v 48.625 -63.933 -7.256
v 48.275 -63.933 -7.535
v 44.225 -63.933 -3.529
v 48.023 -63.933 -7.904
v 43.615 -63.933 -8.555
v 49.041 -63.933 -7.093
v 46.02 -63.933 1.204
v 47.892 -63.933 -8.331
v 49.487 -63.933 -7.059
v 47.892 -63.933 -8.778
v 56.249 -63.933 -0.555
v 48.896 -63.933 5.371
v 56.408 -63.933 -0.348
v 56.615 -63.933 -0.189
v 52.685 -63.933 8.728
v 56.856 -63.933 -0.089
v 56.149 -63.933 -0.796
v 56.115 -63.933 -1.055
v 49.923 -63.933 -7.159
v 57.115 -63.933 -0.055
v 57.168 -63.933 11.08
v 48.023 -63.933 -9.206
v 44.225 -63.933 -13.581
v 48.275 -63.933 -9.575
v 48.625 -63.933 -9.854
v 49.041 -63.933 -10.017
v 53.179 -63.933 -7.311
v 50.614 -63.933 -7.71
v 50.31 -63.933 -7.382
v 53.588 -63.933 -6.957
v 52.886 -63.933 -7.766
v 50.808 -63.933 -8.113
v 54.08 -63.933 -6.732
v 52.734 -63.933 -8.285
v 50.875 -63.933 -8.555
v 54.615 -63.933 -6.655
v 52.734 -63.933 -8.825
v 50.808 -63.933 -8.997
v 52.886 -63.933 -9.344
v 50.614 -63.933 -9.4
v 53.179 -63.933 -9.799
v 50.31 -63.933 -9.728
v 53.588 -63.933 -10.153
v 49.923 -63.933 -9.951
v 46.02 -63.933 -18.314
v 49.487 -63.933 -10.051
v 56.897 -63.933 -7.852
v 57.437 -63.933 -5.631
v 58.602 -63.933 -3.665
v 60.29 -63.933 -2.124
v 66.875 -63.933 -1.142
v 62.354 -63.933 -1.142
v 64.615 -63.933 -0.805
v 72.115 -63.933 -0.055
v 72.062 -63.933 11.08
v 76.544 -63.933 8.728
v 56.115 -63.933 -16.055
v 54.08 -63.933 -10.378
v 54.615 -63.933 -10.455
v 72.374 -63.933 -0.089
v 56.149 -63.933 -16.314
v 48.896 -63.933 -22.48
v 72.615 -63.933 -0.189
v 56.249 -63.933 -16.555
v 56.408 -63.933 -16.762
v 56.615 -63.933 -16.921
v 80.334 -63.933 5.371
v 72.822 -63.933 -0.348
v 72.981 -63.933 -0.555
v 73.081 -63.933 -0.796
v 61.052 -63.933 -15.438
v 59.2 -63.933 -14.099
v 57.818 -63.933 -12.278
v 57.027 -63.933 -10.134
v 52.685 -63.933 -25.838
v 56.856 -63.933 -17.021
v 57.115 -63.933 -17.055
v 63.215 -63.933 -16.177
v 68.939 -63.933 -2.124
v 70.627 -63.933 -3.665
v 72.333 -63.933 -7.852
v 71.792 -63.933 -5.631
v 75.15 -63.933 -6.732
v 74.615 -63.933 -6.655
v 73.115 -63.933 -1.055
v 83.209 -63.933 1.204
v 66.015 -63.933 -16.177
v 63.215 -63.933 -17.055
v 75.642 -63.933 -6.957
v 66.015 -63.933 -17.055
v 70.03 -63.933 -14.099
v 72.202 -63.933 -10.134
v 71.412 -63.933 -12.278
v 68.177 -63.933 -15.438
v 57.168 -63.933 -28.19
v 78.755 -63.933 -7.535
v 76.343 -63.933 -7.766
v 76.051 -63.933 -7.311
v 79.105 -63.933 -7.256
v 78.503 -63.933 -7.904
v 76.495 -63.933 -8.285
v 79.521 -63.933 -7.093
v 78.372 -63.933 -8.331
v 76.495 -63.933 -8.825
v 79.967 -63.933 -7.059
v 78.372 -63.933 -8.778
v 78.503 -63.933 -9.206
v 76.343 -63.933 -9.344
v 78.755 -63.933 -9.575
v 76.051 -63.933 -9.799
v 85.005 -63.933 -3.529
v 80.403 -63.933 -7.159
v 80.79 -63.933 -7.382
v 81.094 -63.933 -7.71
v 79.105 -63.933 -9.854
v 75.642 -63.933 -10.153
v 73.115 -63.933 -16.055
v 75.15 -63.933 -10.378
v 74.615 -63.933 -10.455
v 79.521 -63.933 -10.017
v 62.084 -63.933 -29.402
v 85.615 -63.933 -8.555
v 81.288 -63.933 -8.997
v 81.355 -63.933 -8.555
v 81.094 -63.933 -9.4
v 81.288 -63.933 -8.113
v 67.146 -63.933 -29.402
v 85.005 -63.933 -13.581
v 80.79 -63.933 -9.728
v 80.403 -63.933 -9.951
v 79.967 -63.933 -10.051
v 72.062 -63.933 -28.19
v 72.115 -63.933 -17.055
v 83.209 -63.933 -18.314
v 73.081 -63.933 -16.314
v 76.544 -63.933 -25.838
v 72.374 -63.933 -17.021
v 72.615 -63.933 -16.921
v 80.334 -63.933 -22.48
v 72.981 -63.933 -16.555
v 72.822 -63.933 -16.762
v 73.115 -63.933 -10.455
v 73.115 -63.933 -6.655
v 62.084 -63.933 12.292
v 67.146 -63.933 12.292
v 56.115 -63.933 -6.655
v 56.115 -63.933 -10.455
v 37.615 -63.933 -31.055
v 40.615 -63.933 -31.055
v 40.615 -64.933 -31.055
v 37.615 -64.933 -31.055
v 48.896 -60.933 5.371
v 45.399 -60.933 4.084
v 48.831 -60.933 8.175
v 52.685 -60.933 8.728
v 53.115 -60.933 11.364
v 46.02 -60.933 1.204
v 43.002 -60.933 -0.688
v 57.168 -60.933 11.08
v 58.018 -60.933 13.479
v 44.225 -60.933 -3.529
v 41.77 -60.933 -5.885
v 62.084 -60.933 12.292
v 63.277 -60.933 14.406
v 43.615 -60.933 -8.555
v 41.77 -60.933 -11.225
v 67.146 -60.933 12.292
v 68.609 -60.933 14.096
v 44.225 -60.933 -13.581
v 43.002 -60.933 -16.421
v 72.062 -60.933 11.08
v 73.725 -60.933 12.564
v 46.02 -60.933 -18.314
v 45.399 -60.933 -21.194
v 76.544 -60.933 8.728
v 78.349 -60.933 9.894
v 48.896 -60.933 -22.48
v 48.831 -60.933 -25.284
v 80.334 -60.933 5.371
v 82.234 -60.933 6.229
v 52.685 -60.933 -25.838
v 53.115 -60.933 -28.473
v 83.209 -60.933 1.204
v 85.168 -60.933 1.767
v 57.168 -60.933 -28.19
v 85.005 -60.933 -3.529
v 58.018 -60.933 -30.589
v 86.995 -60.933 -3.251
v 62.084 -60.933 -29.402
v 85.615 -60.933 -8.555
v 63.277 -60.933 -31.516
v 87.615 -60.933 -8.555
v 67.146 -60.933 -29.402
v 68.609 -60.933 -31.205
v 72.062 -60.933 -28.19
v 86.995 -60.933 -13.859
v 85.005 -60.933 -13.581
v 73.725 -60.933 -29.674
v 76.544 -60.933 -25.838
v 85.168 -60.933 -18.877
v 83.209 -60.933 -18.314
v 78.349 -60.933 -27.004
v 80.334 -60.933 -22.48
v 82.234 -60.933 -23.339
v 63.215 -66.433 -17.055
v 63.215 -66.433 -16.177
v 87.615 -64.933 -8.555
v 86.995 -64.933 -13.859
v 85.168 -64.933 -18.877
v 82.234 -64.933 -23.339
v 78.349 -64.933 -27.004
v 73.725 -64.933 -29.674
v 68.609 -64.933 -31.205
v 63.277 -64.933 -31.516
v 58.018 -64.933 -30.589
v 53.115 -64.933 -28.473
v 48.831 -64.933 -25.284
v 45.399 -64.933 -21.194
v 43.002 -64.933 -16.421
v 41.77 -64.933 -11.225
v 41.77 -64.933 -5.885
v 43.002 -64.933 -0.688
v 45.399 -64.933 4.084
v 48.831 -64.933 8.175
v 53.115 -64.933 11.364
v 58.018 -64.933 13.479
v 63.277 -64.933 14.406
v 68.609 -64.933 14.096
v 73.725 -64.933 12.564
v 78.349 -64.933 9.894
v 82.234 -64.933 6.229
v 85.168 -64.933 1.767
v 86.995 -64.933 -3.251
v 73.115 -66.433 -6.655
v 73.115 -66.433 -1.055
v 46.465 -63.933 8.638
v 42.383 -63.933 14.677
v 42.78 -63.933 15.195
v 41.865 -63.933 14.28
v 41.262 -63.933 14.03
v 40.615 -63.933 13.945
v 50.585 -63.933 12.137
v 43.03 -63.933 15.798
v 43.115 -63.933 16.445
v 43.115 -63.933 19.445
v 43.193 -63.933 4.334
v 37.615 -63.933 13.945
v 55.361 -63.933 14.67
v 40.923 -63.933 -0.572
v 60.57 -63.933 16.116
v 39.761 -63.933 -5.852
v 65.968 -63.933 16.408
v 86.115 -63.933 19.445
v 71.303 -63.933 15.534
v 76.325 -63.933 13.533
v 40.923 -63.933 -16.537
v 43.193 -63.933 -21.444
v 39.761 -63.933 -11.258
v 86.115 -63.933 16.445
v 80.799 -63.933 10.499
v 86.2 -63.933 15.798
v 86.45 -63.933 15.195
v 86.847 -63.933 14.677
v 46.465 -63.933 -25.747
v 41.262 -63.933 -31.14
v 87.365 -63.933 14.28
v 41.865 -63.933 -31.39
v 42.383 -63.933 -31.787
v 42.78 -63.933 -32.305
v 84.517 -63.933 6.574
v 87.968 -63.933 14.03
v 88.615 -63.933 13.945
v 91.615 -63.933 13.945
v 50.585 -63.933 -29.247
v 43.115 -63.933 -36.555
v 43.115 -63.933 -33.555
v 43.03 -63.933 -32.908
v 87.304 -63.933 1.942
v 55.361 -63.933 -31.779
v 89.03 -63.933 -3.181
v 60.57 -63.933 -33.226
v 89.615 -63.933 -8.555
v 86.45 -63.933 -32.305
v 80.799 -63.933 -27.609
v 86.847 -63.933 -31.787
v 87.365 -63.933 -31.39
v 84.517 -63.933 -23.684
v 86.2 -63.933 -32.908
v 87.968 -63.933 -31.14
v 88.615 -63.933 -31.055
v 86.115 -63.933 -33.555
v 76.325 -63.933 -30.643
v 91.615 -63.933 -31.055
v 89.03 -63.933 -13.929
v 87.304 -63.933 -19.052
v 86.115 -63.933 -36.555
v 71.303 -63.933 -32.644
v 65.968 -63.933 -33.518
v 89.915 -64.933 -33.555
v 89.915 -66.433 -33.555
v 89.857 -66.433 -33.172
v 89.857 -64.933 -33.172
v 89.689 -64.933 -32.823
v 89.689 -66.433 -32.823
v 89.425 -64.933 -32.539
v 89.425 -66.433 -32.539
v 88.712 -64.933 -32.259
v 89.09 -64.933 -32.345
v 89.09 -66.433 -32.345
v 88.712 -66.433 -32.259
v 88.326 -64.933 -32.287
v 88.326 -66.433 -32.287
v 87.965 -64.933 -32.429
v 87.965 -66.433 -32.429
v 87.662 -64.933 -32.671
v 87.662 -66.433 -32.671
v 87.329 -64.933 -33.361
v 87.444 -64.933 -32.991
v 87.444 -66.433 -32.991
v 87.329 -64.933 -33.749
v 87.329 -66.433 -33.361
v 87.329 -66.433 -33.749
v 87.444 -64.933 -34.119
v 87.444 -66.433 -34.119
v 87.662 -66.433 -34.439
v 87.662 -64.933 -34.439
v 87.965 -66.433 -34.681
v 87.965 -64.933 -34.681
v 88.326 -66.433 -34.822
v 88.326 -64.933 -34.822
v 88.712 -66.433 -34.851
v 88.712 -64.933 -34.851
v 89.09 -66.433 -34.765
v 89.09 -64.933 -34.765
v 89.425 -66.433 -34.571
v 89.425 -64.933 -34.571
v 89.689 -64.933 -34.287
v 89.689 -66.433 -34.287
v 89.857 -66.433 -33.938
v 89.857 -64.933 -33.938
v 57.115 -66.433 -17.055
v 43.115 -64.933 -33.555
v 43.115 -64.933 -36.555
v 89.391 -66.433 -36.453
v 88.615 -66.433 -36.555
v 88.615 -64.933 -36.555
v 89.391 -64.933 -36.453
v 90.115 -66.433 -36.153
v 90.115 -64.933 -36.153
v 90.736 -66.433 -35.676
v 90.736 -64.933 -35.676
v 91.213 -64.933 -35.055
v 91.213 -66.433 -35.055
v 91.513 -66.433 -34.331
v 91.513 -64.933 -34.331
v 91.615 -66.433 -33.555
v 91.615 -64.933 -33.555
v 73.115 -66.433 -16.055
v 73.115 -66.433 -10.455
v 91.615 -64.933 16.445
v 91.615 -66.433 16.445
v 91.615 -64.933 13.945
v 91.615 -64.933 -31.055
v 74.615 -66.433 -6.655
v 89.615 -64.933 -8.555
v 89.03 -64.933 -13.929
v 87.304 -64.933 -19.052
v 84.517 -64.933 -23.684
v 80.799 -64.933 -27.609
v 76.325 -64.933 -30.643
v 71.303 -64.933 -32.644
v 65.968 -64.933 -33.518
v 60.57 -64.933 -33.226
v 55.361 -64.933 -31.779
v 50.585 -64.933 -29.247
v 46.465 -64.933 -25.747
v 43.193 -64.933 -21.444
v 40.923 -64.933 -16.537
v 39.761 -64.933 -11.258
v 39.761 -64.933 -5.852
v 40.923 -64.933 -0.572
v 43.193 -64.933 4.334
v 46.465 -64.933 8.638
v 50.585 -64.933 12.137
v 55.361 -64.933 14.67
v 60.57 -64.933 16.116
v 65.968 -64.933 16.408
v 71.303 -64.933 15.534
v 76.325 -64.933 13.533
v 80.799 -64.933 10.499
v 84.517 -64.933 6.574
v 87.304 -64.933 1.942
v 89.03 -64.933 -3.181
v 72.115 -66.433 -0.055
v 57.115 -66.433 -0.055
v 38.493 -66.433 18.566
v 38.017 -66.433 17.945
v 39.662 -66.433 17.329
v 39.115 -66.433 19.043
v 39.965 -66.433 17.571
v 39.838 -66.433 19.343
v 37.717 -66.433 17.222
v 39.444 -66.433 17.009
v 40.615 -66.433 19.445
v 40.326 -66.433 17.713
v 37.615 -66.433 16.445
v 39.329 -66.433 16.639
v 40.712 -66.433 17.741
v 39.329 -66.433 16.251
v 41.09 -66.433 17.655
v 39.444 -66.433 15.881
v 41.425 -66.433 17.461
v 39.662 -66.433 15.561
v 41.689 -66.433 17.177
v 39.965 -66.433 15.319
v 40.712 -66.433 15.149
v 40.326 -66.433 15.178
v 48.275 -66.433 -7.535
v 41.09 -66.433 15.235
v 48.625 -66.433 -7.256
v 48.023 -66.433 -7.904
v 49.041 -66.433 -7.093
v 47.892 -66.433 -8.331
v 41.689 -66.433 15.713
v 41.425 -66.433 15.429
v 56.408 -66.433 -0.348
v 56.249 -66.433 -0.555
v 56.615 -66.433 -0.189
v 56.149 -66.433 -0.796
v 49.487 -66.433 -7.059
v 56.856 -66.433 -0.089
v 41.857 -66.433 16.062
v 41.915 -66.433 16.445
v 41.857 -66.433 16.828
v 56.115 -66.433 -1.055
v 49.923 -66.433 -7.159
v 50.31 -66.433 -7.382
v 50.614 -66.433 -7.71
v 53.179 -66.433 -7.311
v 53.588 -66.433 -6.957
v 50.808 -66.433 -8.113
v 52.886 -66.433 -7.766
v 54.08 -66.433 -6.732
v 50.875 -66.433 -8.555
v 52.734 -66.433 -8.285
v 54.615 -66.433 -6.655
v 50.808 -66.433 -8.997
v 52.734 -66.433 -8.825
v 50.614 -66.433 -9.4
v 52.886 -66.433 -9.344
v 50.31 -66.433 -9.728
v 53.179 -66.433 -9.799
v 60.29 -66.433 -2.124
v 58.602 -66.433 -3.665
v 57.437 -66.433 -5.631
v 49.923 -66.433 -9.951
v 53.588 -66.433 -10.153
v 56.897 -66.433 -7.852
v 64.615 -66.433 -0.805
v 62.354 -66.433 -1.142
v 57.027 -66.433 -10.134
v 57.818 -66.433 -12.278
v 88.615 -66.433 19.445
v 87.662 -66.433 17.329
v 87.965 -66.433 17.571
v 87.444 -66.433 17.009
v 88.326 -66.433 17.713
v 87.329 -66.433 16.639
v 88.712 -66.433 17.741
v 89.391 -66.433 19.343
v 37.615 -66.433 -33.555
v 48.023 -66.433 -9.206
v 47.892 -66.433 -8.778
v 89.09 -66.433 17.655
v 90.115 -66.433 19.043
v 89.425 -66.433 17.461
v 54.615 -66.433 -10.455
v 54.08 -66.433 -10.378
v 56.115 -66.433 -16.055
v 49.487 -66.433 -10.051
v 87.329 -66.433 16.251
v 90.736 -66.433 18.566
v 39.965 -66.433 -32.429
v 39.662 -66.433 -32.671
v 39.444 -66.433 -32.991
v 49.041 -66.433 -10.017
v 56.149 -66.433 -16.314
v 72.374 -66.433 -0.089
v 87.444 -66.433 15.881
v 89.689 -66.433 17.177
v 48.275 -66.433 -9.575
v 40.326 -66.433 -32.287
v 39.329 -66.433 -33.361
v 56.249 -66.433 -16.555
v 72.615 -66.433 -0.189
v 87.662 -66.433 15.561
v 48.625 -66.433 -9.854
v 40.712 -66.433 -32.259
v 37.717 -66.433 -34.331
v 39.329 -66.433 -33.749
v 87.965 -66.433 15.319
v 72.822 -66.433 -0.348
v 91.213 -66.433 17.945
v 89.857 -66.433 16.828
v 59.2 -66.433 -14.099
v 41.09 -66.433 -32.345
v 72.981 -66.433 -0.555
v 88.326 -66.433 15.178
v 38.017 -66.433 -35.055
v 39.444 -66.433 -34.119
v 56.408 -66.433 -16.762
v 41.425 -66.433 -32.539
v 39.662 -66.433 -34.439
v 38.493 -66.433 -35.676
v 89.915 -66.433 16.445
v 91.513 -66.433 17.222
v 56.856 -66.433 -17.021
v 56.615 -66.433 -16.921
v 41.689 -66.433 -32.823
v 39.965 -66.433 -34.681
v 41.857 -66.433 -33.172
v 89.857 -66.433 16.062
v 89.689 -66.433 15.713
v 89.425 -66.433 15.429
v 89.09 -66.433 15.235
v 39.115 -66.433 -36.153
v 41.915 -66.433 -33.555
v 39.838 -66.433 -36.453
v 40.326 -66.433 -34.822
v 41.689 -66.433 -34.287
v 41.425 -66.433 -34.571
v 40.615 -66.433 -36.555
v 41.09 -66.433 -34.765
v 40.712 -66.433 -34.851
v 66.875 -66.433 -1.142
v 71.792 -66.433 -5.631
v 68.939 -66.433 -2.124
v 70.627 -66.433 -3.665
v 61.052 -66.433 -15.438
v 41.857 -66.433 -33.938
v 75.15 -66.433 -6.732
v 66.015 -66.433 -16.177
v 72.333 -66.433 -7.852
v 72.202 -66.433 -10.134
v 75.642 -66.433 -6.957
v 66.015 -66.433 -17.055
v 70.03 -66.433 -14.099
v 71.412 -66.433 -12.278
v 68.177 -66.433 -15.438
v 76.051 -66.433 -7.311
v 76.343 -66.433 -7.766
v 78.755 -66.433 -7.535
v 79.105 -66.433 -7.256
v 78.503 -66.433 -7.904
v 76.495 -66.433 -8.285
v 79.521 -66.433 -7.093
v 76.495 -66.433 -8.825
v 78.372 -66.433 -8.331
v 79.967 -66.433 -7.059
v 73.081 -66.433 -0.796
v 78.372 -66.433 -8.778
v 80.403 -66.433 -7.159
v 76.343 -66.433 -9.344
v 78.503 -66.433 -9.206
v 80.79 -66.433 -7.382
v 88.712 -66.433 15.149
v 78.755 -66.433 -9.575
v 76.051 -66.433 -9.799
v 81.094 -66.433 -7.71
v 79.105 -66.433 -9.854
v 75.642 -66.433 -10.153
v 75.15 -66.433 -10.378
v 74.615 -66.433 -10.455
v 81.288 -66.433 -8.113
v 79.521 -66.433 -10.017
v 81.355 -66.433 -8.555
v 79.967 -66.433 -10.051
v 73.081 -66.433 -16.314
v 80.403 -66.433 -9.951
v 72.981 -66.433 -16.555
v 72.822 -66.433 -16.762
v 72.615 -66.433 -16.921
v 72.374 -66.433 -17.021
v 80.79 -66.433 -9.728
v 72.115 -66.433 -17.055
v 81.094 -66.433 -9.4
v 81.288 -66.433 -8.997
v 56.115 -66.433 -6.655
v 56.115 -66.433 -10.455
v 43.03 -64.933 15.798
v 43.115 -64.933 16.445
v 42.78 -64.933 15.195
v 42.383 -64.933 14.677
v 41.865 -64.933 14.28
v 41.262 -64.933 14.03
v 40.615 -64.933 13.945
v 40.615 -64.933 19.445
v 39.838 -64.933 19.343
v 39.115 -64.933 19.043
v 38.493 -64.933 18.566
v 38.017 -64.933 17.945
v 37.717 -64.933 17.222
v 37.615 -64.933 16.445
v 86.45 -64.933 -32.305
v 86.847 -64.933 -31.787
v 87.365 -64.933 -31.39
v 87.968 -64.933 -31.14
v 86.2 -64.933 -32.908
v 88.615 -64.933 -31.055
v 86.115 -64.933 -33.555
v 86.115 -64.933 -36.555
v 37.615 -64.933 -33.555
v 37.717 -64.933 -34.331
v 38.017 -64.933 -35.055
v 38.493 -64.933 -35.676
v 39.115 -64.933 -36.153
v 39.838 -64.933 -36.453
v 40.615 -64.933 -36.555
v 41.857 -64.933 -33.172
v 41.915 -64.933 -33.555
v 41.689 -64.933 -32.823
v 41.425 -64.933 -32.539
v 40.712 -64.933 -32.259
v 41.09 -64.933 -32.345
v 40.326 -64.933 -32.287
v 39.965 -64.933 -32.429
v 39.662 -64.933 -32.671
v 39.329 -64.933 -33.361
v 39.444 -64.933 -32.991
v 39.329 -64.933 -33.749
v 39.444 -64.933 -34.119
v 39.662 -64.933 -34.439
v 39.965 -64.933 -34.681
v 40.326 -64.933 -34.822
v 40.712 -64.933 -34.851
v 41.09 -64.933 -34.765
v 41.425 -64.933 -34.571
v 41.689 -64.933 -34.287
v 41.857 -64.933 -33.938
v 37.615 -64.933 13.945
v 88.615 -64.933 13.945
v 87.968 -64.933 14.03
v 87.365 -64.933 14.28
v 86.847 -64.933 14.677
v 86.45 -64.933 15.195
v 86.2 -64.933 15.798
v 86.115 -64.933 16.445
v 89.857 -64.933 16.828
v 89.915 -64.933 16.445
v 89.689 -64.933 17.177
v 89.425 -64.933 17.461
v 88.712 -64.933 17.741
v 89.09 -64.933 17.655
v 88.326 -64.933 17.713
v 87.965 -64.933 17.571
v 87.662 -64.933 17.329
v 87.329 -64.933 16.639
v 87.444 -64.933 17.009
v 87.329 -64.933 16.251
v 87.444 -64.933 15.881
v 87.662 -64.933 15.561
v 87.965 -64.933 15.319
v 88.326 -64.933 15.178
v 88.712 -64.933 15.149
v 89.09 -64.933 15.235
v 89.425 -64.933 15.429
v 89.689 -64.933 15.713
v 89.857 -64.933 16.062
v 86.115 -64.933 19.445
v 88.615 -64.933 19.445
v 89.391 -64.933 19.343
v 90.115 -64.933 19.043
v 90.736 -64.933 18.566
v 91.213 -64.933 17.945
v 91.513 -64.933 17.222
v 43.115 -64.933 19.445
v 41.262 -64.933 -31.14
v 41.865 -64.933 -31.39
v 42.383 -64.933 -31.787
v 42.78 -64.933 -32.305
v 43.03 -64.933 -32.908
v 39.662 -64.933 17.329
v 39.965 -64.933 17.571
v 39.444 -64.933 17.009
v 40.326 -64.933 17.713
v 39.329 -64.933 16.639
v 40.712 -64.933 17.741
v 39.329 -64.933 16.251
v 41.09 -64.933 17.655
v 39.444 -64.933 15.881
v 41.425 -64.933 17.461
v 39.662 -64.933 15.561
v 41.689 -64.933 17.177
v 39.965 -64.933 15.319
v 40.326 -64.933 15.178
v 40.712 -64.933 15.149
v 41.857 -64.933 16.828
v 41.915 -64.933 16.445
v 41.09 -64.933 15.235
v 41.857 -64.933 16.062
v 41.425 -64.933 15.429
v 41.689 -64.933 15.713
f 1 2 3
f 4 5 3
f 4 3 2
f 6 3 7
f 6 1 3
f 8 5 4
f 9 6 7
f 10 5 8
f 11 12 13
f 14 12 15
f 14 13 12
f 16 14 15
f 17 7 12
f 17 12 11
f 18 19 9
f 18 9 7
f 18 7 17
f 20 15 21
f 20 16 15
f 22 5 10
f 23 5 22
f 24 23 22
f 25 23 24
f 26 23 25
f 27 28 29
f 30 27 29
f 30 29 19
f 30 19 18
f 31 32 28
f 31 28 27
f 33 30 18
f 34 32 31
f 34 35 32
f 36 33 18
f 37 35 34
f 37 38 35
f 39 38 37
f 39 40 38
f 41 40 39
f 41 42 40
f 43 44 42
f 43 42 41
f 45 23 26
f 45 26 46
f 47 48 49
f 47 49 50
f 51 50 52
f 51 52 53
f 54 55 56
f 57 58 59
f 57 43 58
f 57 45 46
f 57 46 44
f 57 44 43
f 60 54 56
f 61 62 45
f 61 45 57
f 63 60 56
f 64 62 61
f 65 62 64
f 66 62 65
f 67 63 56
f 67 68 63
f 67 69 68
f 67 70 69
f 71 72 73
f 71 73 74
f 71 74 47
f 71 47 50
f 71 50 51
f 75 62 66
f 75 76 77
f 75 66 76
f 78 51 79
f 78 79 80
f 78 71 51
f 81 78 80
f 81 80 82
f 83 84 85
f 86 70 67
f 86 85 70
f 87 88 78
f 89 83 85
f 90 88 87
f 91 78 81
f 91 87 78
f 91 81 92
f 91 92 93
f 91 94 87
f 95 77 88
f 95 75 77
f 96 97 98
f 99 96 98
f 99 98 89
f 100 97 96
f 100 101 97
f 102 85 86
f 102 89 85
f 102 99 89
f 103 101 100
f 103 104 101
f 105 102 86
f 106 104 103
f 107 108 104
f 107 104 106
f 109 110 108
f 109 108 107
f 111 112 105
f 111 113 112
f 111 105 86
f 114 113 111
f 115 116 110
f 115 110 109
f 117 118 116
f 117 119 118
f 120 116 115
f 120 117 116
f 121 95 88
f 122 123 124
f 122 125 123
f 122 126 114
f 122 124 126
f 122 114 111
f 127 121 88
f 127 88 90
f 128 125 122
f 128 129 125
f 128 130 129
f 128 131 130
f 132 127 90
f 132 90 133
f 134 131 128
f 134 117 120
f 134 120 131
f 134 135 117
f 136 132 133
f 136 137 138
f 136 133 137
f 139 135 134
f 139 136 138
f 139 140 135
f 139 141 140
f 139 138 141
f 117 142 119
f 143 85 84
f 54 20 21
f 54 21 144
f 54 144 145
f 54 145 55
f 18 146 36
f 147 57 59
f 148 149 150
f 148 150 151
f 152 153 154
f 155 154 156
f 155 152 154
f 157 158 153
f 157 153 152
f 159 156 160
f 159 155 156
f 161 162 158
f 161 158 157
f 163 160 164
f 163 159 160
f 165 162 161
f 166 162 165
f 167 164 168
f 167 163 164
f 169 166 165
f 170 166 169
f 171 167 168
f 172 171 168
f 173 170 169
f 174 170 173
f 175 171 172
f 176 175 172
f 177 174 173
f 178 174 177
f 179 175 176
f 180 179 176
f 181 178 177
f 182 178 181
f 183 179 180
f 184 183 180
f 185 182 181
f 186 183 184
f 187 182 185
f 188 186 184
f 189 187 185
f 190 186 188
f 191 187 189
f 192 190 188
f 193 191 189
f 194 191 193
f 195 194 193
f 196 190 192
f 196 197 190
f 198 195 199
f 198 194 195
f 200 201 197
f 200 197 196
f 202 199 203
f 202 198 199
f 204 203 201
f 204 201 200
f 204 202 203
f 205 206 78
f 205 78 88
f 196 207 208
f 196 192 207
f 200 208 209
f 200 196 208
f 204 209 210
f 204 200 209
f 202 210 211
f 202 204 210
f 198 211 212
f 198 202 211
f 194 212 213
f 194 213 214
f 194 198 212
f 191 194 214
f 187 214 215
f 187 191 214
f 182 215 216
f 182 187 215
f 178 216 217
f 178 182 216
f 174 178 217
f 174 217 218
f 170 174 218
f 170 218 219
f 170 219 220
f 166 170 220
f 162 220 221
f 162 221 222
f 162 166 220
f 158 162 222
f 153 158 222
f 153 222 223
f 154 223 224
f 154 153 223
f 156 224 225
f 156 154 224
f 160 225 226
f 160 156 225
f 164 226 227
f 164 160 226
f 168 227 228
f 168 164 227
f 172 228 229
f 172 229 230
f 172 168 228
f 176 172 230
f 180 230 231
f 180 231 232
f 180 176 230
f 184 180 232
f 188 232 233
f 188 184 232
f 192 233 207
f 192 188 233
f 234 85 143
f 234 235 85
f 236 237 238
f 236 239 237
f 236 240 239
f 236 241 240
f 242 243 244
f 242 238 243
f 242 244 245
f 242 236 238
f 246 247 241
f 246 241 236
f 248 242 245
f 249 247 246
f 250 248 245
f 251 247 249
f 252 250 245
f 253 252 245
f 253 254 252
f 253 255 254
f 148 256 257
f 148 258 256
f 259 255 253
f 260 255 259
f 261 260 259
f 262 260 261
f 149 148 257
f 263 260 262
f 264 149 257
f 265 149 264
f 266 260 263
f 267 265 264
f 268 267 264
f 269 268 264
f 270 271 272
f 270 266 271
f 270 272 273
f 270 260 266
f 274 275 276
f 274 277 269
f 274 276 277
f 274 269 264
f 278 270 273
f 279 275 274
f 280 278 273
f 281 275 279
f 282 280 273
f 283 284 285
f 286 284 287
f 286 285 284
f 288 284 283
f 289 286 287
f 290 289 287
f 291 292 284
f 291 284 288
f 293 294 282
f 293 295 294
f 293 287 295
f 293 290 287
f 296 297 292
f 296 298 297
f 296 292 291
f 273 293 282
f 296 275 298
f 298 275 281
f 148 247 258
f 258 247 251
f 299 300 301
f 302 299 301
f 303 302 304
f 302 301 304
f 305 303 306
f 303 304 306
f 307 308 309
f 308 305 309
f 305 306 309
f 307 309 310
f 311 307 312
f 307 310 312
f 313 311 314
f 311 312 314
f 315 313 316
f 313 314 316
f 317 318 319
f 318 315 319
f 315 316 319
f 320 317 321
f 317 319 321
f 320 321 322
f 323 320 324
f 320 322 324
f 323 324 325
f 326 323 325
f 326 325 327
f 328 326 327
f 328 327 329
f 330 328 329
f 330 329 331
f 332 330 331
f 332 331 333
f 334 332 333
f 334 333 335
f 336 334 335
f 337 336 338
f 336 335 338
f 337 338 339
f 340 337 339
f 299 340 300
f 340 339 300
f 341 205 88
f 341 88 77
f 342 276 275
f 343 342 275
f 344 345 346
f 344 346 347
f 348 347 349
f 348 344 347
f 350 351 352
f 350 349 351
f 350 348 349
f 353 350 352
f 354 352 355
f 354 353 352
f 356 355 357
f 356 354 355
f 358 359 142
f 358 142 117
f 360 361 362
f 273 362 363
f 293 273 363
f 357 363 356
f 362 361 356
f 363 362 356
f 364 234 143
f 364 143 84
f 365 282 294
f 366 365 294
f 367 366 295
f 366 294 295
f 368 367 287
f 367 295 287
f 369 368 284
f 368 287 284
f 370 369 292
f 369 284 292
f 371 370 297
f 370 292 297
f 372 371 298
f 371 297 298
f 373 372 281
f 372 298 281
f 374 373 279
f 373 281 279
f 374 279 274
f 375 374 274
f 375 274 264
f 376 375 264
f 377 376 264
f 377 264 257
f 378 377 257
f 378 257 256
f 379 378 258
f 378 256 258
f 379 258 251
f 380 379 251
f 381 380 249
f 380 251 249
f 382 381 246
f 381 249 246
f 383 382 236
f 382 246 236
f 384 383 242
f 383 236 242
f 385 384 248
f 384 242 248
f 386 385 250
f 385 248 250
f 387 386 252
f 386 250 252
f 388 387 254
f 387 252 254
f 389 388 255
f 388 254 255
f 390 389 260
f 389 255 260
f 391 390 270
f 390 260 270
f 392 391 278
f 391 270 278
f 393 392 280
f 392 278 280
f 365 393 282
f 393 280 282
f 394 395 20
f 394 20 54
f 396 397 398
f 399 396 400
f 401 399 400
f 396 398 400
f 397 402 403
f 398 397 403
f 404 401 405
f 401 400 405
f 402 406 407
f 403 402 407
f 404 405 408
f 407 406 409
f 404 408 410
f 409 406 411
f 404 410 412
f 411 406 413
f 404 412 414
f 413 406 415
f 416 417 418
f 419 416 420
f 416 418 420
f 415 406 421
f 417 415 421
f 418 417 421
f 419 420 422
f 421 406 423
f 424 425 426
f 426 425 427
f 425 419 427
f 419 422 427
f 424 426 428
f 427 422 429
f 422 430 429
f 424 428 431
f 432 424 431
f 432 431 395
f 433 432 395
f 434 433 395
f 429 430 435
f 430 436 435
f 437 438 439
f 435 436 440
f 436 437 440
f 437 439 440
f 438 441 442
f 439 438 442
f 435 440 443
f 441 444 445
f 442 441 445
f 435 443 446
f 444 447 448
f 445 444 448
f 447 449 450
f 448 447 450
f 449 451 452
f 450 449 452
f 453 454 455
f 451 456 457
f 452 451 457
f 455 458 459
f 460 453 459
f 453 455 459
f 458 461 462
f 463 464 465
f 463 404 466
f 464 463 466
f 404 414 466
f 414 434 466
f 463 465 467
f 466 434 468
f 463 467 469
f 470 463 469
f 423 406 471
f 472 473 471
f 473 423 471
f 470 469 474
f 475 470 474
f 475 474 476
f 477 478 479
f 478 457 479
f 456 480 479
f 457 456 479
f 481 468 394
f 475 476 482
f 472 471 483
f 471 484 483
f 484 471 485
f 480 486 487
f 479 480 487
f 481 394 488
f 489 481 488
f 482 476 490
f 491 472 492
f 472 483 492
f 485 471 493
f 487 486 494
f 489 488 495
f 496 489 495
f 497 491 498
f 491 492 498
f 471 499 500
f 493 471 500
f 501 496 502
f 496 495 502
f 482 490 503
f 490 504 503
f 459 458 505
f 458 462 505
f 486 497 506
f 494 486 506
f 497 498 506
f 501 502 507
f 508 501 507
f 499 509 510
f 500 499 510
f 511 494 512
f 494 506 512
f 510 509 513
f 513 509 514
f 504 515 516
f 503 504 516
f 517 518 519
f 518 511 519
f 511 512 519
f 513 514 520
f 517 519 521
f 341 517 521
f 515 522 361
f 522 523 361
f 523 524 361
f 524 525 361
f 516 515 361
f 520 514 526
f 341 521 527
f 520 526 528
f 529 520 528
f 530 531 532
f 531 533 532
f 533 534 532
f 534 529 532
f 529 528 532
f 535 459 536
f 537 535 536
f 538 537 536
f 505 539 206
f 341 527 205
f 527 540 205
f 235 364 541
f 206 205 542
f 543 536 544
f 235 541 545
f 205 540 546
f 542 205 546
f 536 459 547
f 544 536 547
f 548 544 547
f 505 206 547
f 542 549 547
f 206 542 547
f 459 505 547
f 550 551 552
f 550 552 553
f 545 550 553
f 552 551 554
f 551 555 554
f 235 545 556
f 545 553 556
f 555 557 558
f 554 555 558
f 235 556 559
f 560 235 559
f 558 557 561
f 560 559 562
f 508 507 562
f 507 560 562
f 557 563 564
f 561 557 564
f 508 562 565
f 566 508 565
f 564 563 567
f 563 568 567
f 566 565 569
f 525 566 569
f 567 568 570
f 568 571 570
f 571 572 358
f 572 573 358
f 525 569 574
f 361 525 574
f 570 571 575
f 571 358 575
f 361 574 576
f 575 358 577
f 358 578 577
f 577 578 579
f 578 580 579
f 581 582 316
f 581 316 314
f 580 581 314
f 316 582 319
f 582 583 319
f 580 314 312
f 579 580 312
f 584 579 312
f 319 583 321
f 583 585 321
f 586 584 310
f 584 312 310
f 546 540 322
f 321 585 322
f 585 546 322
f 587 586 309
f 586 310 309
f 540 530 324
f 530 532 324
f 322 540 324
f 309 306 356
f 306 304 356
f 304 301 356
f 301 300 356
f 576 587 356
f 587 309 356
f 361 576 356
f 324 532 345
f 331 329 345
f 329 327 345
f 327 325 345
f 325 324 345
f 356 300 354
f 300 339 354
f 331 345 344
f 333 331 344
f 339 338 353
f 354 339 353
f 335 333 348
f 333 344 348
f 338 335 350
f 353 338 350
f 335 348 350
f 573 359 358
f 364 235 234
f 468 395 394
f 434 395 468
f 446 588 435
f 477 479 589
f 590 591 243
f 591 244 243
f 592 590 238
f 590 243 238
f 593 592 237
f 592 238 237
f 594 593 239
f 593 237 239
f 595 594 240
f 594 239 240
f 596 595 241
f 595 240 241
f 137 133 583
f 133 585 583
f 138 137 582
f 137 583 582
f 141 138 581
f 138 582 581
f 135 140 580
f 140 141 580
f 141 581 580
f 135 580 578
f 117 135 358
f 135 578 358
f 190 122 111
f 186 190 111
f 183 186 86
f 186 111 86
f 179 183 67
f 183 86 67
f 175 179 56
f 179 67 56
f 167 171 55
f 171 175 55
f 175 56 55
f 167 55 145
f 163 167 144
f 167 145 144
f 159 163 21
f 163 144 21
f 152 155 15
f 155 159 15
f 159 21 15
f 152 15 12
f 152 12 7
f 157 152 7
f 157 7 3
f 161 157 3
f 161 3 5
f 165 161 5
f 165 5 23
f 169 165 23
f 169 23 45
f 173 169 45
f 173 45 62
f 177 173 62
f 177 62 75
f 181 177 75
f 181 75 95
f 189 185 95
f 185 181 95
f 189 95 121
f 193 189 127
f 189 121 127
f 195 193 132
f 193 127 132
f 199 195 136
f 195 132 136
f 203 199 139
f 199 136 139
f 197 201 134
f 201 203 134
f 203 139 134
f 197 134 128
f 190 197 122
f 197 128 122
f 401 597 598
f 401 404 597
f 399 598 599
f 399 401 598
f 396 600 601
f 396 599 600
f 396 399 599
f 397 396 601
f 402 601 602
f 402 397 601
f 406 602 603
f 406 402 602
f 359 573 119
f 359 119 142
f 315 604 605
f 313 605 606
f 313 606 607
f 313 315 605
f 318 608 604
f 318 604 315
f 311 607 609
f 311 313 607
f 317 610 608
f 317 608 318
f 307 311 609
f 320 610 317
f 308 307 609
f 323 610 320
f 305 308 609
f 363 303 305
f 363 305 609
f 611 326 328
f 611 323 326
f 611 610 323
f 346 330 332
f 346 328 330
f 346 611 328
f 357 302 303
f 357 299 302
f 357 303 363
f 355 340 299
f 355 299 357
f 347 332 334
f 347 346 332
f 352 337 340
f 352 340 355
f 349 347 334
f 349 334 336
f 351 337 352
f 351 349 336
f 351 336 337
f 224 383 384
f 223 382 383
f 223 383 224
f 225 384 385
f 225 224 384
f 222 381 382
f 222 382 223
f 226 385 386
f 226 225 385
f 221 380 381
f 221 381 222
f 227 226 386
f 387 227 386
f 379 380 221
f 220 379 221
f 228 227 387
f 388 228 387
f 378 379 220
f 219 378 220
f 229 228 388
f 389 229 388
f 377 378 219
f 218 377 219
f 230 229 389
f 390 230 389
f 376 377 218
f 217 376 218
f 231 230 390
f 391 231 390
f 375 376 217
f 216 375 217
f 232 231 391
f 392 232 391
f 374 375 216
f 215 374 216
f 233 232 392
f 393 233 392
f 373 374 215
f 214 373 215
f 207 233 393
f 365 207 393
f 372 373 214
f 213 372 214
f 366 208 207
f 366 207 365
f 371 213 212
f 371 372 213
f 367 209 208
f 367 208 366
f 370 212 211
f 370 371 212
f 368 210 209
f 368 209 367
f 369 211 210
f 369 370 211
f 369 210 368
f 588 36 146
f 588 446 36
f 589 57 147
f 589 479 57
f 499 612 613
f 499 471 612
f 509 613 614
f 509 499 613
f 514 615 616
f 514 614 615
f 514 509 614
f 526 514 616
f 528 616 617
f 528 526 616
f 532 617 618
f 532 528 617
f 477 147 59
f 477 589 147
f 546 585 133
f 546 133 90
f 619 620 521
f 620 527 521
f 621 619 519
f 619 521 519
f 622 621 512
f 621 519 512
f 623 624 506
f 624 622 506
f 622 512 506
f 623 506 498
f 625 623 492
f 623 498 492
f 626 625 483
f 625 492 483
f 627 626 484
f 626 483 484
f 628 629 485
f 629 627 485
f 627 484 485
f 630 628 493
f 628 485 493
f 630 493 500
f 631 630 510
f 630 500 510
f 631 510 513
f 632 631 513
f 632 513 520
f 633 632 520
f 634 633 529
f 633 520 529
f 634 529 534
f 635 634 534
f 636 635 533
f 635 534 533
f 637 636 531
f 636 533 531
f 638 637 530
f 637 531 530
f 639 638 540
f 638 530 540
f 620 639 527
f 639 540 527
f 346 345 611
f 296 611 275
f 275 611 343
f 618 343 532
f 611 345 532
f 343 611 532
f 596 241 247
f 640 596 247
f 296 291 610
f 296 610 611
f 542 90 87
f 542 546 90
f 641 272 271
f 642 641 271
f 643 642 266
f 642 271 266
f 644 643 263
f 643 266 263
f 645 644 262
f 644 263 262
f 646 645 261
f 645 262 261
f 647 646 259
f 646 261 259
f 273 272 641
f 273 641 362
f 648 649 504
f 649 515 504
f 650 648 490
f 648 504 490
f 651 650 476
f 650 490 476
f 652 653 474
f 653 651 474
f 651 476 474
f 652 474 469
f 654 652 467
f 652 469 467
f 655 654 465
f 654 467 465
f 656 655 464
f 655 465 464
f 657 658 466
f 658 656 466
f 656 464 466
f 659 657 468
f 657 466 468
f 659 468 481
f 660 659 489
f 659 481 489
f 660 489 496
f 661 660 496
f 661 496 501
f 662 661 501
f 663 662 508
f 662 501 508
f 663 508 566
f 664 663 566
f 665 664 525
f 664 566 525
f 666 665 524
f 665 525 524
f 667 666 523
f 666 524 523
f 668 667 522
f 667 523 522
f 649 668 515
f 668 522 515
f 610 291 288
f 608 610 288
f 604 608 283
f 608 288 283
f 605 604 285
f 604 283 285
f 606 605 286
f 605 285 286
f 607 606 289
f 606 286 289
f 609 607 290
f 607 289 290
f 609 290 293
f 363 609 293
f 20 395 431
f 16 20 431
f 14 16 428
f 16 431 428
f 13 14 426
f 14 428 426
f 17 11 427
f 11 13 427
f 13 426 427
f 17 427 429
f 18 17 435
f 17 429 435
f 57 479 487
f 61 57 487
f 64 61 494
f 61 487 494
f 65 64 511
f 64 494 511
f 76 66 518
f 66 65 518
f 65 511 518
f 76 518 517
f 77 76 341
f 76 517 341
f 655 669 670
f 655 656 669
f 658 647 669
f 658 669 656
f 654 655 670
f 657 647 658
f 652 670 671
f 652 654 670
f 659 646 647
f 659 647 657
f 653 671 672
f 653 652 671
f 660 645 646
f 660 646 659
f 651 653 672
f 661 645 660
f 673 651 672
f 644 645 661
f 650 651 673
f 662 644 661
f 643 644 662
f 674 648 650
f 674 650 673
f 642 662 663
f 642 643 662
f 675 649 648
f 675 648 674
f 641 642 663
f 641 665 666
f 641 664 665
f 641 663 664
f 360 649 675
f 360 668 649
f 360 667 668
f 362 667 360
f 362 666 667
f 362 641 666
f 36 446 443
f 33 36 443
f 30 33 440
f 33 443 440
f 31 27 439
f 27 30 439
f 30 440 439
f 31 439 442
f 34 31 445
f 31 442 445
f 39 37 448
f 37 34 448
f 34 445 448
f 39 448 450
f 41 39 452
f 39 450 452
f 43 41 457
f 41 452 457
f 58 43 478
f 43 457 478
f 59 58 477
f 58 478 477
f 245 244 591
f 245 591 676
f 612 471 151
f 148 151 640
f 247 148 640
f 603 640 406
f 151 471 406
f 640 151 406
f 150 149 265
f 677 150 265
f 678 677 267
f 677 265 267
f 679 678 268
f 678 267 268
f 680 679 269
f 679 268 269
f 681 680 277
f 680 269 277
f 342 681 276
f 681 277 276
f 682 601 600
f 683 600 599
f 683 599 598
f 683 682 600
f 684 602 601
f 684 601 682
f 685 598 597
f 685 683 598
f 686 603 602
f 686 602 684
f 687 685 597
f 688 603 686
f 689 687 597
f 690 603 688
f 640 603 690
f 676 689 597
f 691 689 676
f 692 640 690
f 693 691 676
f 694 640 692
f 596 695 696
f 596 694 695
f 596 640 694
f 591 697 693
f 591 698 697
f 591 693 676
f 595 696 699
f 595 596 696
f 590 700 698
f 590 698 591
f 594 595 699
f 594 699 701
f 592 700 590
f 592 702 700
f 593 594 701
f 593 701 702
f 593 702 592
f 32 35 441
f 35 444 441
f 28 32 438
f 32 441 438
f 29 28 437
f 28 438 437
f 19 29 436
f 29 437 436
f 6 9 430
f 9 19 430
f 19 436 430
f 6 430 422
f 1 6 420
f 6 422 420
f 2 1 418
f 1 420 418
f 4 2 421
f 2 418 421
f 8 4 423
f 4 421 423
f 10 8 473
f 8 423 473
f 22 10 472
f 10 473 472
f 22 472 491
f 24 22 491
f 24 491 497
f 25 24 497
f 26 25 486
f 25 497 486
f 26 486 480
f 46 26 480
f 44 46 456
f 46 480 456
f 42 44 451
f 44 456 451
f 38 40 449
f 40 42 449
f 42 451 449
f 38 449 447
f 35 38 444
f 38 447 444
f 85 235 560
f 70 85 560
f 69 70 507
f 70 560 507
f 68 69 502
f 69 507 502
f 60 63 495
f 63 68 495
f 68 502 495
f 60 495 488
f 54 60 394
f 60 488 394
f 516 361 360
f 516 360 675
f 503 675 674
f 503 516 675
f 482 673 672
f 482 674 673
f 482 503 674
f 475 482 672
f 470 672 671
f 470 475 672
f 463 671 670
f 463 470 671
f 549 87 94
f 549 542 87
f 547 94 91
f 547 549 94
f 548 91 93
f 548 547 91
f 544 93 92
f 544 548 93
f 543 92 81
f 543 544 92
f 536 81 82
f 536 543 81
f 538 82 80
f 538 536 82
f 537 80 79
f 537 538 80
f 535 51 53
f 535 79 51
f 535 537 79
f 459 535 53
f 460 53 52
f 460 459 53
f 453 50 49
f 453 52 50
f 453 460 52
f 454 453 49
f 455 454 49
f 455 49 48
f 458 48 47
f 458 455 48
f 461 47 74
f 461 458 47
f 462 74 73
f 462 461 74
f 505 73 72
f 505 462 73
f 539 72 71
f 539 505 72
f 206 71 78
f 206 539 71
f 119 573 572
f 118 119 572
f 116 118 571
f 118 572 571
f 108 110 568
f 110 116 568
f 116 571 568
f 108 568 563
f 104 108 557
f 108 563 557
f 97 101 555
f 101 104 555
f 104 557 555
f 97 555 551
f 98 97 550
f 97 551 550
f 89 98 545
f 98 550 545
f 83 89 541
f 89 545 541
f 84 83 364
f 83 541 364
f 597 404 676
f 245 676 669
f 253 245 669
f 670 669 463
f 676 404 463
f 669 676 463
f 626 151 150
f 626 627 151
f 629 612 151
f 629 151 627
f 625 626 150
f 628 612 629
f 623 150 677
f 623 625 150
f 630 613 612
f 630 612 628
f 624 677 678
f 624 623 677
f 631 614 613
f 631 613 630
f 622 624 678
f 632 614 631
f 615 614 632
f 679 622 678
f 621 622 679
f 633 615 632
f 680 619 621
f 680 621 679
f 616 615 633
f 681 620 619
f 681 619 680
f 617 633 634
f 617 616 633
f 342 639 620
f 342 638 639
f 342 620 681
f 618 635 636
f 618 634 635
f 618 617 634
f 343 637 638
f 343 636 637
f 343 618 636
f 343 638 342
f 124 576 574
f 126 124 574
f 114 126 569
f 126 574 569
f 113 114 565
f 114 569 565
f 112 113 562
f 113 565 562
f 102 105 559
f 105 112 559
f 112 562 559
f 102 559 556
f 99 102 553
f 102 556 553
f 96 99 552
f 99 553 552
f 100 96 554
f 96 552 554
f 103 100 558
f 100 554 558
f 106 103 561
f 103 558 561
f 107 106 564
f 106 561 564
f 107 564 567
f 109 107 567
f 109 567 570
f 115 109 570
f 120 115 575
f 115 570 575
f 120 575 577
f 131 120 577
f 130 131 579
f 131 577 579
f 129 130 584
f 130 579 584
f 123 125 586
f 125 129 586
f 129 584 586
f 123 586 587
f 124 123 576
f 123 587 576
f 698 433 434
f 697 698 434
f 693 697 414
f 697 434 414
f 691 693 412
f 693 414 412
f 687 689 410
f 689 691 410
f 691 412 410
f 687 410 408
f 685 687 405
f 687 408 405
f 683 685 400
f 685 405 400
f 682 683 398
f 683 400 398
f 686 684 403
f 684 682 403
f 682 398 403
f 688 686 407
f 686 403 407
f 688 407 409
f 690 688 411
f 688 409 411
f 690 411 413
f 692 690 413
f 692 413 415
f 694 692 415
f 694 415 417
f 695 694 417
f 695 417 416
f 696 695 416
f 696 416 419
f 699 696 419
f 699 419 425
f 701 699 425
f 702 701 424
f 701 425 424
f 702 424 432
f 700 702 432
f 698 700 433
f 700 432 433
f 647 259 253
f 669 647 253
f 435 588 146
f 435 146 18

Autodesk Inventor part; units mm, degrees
ref_plane "YZ Plane" through (0, 0, 0) normal (1, 0, 0) x (0, 1, 0)
ref_plane "XZ Plane" through (0, 0, 0) normal (0, 1, 0) x (-1, 0, 0)
ref_plane "XY Plane" through (0, 0, 0) normal (0, 0, 1) x (1, 0, 0)
ref_plane "作業平面1" through (56.3598, -66.4332, -0.2999) normal (0, 1, 0) x (1, 0, 0)
sketch "スケッチ1" plane through (56.3598, -66.4332, -0.2999) normal (0, 1, 0) x (1, 0, 0)
  line L0 (9.655, 16.755) -> (9.655, 15.8775) projected
  arc A0 (6.855, 15.8775) -> (9.655, 15.8775) centre (8.255, 8.255) ccw projected
  line L1 (6.855, 15.8775) -> (6.855, 16.755) projected
  line L2 (6.855, 16.755) -> (0.755, 16.755) projected
  arc A1 (0.755, 16.755) -> (-0.245, 15.755) centre (0.755, 15.755) ccw projected
  line L3 (-0.245, 15.755) -> (-0.245, 10.155) projected
  line L4 (-0.245, 10.155) -> (-1.745, 10.155) projected
  arc A2 (-1.745, 10.155) -> (-1.745, 6.355) centre (-1.745, 8.255) ccw projected
  line L5 (-1.745, 6.355) -> (-0.245, 6.355) projected
  line L6 (-0.245, 6.355) -> (-0.245, 0.755) projected
  arc A3 (-0.245, 0.755) -> (0.755, -0.245) centre (0.755, 0.755) ccw projected
  line L7 (0.755, -0.245) -> (15.755, -0.245) projected
  arc A4 (15.755, -0.245) -> (16.755, 0.755) centre (15.755, 0.755) ccw projected
  line L8 (16.755, 0.755) -> (16.755, 6.355) projected
  line L9 (16.755, 6.355) -> (18.255, 6.355) projected
  arc A5 (18.255, 6.355) -> (18.255, 10.155) centre (18.255, 8.255) ccw projected
  line L10 (18.255, 10.155) -> (16.755, 10.155) projected
  line L11 (16.755, 10.155) -> (16.755, 15.755) projected
  arc A6 (16.755, 15.755) -> (15.755, 16.755) centre (15.755, 15.755) ccw projected
  line L12 (15.755, 16.755) -> (9.655, 16.755) projected
  circle A7 centre (-1.745, 8.255) radius 0.9 projected
  circle A8 centre (18.255, 8.255) radius 0.9 projected
  circle A9 centre (-6.985, 8.255) radius 1.5 projected
  circle A10 centre (23.495, 8.255) radius 1.5 projected
  line L13 (-15.745, -19.745) -> (32.255, -19.745)
  line L14 (35.255, -16.745) -> (35.255, 33.255)
  line L15 (32.255, 36.255) -> (-15.745, 36.255)
  line L16 (-18.745, 33.255) -> (-18.745, -16.745)
  line L17 (-18.745, -19.745) -> (35.255, 36.255) construction
  line L18 (35.255, -19.745) -> (-18.745, 36.255) construction
  line L19 (8.255, 36.255) -> (8.255, -19.745) construction
  line L20 (-18.745, 8.255) -> (35.255, 8.255) construction
  arc A11 (-15.745, 36.255) -> (-18.745, 33.255) centre (-15.745, 33.255) ccw
  arc A12 (35.255, 33.255) -> (32.255, 36.255) centre (32.255, 33.255) ccw
  arc A13 (32.255, -19.745) -> (35.255, -16.745) centre (32.255, -16.745) ccw
  arc A14 (-18.745, -16.745) -> (-15.745, -19.745) centre (-15.745, -16.745) ccw
  circle A15 centre (-15.745, 33.255) radius 1.3
  circle A16 centre (32.255, 33.255) radius 1.3
  circle A17 centre (-15.745, -16.745) radius 1.3
  circle A18 centre (32.255, -16.745) radius 1.3
  circle A19 centre (8.255, 8.255) radius 25
  line L21 (32.255, -16.745) -> (-15.745, -16.745) construction
  line L22 (-15.745, -16.745) -> (-15.745, 33.255) construction
  line L23 (-15.745, 33.255) -> (32.255, 33.255) construction
  line L24 (32.255, 33.255) -> (32.255, -16.745) construction
  line L25 (32.255, -16.745) -> (-15.745, 33.255) construction
  line L26 (-15.745, -16.745) -> (32.255, 33.255) construction
  point P0 (-56.3598, -0.2999)
  dimension "d0" = 3
  dimension "d2" = 54
  dimension "d3" = 2.6
  dimension "d4" = 50
  dimension "d7" = 48
  dimension "d8" = 50
  dimension "d9" = 56
extrude "押し出し1" add sketch "スケッチ1" along normal blind 2.5 contours A14 L16 A11 L15 A12 L14 A13 L13 | A19
sketch "スケッチ2" plane through (56.3598, -63.9332, -0.2999) normal (0, 1, 0) x (1, 0, 0)
  arc A0 (32.255, -19.745) -> (35.255, -16.745) centre (32.255, -16.745) ccw projected
  line L0 (35.255, -16.745) -> (35.255, 33.255) projected
  arc A1 (35.255, 33.255) -> (32.255, 36.255) centre (32.255, 33.255) ccw projected
  line L1 (32.255, 36.255) -> (-15.745, 36.255) projected
  arc A2 (-15.745, 36.255) -> (-18.745, 33.255) centre (-15.745, 33.255) ccw projected
  line L2 (-18.745, 33.255) -> (-18.745, -16.745) projected
  arc A3 (-18.745, -16.745) -> (-15.745, -19.745) centre (-15.745, -16.745) ccw projected
  line L3 (-15.745, -19.745) -> (32.255, -19.745) projected
  arc A4 (6.855, 15.8775) -> (9.655, 15.8775) centre (8.255, 8.255) ccw projected
  line L4 (9.655, 15.8775) -> (9.655, 16.755) projected
  line L5 (9.655, 16.755) -> (15.755, 16.755) projected
  arc A5 (16.755, 15.755) -> (15.755, 16.755) centre (15.755, 15.755) ccw projected
  line L6 (16.755, 15.755) -> (16.755, 10.155) projected
  line L7 (16.755, 10.155) -> (18.255, 10.155) projected
  arc A6 (18.255, 6.355) -> (18.255, 10.155) centre (18.255, 8.255) ccw projected
  line L8 (18.255, 6.355) -> (16.755, 6.355) projected
  line L9 (16.755, 6.355) -> (16.755, 0.755) projected
  arc A7 (15.755, -0.245) -> (16.755, 0.755) centre (15.755, 0.755) ccw projected
  line L10 (15.755, -0.245) -> (0.755, -0.245) projected
  arc A8 (-0.245, 0.755) -> (0.755, -0.245) centre (0.755, 0.755) ccw projected
  line L11 (-0.245, 0.755) -> (-0.245, 6.355) projected
  line L12 (-0.245, 6.355) -> (-1.745, 6.355) projected
  arc A9 (-1.745, 10.155) -> (-1.745, 6.355) centre (-1.745, 8.255) ccw projected
  line L13 (-1.745, 10.155) -> (-0.245, 10.155) projected
  line L14 (-0.245, 10.155) -> (-0.245, 15.755) projected
  arc A10 (0.755, 16.755) -> (-0.245, 15.755) centre (0.755, 15.755) ccw projected
  line L15 (0.755, 16.755) -> (6.855, 16.755) projected
  line L16 (6.855, 16.755) -> (6.855, 15.8775) projected
  circle A11 centre (-6.985, 8.255) radius 1.5 projected
  circle A12 centre (23.495, 8.255) radius 1.5 projected
  circle A13 centre (32.255, -16.745) radius 1.3 projected
  circle A14 centre (-15.745, -16.745) radius 1.3 projected
  circle A15 centre (32.255, 33.255) radius 1.3 projected
  circle A16 centre (-15.745, 33.255) radius 1.3 projected
  circle A17 centre (8.255, 8.255) radius 23
  circle A18 centre (8.255, 8.255) radius 21
  circle A19 centre (8.255, 8.255) radius 25
  arc A20 (-13.245, -16.745) -> (-15.745, -14.245) centre (-15.745, -16.745) ccw
  arc A21 (-15.745, 30.755) -> (-13.245, 33.255) centre (-15.745, 33.255) ccw
  arc A22 (32.255, -14.245) -> (29.755, -16.745) centre (32.255, -16.745) ccw
  arc A23 (29.755, 33.255) -> (32.255, 30.755) centre (32.255, 33.255) ccw
  line L17 (-15.745, -14.245) -> (-18.745, -14.245)
  line L18 (-13.245, -16.745) -> (-13.245, -19.745)
  line L19 (-15.745, 30.755) -> (-18.745, 30.755)
  line L20 (-13.245, 33.255) -> (-13.245, 36.255)
  line L21 (29.755, 33.255) -> (29.755, 36.255)
  line L22 (32.255, 30.755) -> (35.255, 30.755)
  line L23 (32.255, -14.245) -> (35.255, -14.245)
  line L24 (29.755, -16.745) -> (29.755, -19.745)
  line L25 (-18.745, 33.255) -> (-18.745, -16.745) projected
  line L26 (-15.745, -19.745) -> (32.255, -19.745) projected
  line L27 (32.255, 36.255) -> (-15.745, 36.255) projected
  line L28 (35.255, -16.745) -> (35.255, 33.255) projected
  point P0 (-56.3598, -0.2999)
  dimension "d10" = 46
  dimension "d11" = 2
  dimension "d14" = 50
  dimension "d15" = 2.5
extrude "押し出し2" add sketch "スケッチ2" along normal blind 3 contours A17
extrude "押し出し4" cut sketch "スケッチ2" against normal blind 1 contours L3 L24 A22 L23 L0 A0 | L3 A3 L2 L17 A20 L18 | L22 A23 L21 L1 A1 L0 | L2 A2 L1 L20 A21 L19 | A19
properties part number "Camera_Mount"
